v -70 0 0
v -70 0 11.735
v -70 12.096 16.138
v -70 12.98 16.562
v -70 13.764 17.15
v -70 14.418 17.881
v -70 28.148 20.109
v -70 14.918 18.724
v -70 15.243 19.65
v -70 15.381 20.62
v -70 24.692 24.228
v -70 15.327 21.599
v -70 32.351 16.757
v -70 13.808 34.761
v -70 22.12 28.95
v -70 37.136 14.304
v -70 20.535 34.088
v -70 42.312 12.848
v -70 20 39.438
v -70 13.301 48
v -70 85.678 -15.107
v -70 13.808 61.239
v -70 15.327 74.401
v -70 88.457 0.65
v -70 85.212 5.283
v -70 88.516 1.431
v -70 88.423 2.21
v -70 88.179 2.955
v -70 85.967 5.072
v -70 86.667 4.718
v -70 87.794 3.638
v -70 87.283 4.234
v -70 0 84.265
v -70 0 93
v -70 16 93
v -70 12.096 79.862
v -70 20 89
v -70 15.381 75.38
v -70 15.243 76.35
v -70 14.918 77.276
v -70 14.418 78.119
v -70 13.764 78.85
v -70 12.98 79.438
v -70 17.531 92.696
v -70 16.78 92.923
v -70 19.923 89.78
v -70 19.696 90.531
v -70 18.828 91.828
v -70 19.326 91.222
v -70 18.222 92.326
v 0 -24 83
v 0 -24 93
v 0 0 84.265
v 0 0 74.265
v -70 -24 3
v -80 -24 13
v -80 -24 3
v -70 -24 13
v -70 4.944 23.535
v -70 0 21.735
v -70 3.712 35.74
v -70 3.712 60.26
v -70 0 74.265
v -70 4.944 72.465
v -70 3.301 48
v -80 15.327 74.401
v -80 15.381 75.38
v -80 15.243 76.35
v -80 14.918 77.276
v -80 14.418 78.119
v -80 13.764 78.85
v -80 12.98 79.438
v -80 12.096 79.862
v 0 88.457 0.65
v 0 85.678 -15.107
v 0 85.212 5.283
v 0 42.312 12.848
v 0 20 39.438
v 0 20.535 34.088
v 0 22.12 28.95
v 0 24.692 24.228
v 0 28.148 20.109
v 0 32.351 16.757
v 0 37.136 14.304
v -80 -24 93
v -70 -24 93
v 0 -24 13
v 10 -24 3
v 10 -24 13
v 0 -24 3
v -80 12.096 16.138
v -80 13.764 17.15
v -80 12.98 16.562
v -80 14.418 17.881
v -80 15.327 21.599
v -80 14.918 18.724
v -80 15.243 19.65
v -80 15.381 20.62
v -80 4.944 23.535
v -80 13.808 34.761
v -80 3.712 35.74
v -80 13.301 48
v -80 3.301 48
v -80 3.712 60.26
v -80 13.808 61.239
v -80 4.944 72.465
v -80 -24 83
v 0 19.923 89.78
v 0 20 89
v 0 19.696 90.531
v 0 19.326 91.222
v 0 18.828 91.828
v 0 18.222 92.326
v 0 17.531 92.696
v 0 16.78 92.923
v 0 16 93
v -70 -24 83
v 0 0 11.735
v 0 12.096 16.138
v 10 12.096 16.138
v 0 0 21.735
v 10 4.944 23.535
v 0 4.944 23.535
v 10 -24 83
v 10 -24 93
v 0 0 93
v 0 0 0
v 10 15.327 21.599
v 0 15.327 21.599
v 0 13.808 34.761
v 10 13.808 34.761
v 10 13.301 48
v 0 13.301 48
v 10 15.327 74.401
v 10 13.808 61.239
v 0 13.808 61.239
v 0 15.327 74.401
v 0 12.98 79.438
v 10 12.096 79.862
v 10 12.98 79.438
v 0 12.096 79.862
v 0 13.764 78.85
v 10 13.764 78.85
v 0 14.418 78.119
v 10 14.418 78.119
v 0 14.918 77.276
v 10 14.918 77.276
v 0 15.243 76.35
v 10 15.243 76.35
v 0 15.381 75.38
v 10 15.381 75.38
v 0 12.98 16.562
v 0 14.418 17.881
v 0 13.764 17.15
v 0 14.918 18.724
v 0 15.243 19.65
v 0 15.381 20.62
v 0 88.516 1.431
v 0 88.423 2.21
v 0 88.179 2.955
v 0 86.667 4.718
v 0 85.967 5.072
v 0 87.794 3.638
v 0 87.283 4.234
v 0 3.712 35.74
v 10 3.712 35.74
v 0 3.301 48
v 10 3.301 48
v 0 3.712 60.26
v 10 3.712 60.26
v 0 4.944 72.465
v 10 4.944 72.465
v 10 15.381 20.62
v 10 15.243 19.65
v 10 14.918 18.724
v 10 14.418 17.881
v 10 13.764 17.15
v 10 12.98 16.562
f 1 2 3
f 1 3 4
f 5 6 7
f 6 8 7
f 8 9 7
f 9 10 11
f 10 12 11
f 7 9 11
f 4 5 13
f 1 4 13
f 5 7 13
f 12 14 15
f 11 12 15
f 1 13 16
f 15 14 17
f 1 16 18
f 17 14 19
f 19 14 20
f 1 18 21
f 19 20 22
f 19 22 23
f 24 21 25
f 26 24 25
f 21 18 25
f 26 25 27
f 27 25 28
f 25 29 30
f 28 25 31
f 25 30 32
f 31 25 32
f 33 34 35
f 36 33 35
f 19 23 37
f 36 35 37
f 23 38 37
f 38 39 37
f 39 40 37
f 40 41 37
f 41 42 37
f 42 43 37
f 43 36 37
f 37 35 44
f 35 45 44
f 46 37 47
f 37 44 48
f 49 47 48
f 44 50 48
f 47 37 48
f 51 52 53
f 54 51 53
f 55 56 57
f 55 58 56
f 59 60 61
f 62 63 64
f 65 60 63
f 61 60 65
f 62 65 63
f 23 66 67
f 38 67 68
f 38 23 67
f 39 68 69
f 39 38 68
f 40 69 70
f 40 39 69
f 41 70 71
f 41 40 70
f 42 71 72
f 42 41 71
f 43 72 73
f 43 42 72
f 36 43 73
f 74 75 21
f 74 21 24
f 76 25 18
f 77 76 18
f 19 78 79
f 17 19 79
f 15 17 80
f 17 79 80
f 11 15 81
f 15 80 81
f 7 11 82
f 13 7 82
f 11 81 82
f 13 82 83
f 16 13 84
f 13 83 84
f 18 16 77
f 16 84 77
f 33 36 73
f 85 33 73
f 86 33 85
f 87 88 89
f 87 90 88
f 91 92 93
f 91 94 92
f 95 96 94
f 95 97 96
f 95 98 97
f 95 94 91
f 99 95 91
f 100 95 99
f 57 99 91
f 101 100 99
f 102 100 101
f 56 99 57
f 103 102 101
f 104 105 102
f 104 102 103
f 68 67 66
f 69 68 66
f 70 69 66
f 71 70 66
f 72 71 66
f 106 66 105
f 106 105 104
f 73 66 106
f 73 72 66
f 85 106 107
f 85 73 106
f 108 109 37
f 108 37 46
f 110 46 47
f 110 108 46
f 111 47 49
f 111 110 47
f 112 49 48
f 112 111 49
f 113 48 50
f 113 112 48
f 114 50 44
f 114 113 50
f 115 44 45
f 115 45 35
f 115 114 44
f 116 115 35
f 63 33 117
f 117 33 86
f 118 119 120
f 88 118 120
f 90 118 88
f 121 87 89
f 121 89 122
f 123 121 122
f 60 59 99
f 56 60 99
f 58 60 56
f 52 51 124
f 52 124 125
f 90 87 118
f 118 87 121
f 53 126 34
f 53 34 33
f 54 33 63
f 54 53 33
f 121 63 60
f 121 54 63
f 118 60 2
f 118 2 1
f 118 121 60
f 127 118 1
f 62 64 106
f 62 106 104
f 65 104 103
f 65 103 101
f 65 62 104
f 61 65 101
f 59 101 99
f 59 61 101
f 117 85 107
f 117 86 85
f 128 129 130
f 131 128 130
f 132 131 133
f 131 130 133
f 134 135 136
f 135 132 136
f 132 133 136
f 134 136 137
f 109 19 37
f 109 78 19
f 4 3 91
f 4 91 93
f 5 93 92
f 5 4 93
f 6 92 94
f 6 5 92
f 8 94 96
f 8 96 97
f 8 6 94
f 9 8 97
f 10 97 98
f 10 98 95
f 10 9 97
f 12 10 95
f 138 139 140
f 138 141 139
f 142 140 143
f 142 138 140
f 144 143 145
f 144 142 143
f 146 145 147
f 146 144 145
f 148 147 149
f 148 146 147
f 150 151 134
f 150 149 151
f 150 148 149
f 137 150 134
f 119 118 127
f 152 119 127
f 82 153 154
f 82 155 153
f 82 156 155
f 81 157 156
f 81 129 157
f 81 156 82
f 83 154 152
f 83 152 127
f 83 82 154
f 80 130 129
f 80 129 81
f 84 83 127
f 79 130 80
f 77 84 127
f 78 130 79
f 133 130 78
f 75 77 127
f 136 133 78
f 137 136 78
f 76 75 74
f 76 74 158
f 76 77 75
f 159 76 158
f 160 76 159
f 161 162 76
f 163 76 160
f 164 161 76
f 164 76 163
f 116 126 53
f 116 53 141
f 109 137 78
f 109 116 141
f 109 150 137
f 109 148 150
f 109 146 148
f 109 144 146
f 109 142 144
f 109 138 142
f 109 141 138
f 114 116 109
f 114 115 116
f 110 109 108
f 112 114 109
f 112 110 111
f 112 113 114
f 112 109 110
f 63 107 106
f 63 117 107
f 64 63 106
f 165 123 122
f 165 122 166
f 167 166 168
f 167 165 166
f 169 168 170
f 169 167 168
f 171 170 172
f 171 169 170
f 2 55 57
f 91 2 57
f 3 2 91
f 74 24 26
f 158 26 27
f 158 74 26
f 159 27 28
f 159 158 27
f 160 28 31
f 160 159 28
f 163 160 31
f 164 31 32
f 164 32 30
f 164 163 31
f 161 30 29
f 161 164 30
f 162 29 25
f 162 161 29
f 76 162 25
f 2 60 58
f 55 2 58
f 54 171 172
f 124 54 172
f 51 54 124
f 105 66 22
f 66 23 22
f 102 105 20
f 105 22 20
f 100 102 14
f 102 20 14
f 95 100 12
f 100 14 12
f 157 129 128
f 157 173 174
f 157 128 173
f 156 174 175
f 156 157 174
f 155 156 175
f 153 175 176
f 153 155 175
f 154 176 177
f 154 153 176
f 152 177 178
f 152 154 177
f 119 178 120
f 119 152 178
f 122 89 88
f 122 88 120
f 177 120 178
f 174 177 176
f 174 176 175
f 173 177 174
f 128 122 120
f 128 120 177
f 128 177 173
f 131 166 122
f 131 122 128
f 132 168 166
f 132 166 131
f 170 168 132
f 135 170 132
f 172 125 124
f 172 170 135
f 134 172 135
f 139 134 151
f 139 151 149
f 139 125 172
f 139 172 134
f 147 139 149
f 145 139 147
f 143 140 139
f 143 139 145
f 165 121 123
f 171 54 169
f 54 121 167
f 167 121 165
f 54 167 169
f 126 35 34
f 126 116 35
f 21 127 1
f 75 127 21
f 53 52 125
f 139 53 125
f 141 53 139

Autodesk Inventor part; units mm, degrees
ref_plane "YZ Plane" through (0, 0, 0) normal (1, 0, 0) x (0, 1, 0)
ref_plane "XZ Plane" through (0, 0, 0) normal (0, 1, 0) x (-1, 0, 0)
sketch "Boceto1" plane through (0, 0, 0) normal (1, 0, 0) x (0, 1, 0)
  line L0 (85.212, 5.2834) -> (42.3115, 12.8479)
  arc A0 (20, 39.4377) -> (42.3115, 12.8479) centre (47, 39.4377) ccw
  line L1 (20, 39.4377) -> (20, 89)
  line L2 (16, 93) -> (0, 93)
  line L3 (0, 93) -> (0, 0)
  line L4 (0, 0) -> (85.6783, -15.1074)
  line L5 (85.6783, -15.1074) -> (88.4566, 0.6495)
  arc A1 (88.4566, 0.6495) -> (85.212, 5.2834) centre (84.5174, 1.3441) ccw
  arc A2 (20, 89) -> (16, 93) centre (16, 89) ccw
  line L6 (-24, 93) -> (12.0957, 79.8622)
  line L7 (12.0957, 16.1378) -> (-24, 3)
  line L8 (-24, 3) -> (-24, 13)
  line L9 (-24, 13) -> (4.9435, 23.5346)
  line L10 (4.9435, 72.4654) -> (-24, 83)
  line L11 (-24, 83) -> (-24, 93)
  arc A3 (15.327, 74.4007) -> (15.327, 21.5993) centre (186.3007, 48) ccw
  arc A4 (4.9435, 72.4654) -> (4.9435, 23.5346) centre (186.3007, 48) ccw
  arc A5 (15.327, 74.4007) -> (12.0957, 79.8622) centre (10.3856, 75.1638) ccw
  arc A6 (12.0957, 16.1378) -> (15.327, 21.5993) centre (10.3856, 20.8362) ccw
  point P0 (20, 93)
  point P1 (89.1512, 4.5888)
  point P2 (16, 78.4412)
  point P3 (16, 17.5588)
  dimension "d0" = 87
  dimension "d1" = 20
  dimension "d2" = 20
  dimension "d3" = 27
  dimension "d4" = 100
  dimension "d5" = 93
  dimension "d6" = 4
  dimension "d7" = 24
  dimension "d8" = 16
  dimension "d9" = 110
  dimension "d10" = 90
  dimension "d11" = 70
  dimension "d12" = 10
  dimension "d13" = 10
  dimension "d14" = 3
  dimension "d17" = 110
  dimension "d23" = 173
  dimension "d24" = 10
  dimension "d25" = 183
  dimension "d26" = 5
extrude "Extrusión1" add sketch "Boceto1" against normal blind 70 contours A1 L5 L4 L3 L7 A6 A3 A5 L6 L2 A2 L1 A0 L0 | L3 L9 A4 L10 L6 A5 A3 A6 L7 | L3 L10 A4 L9
extrude "Extrusión2" add sketch "Boceto1" along normal blind 10 contours L7 L8 L9 L3 | L3 L9 A4 L10 L6 A5 A3 A6 L7 | L3 L10 L11 L6
ref_plane "Plano de trabajo1" through (-35, 0, 0) normal (1, 0, 0) x (0, 0, -1)
mirror "Simetría1" about plane through (-35, 0, 0) normal (1, 0, 0) of "Extrusión2"
properties part number "Pieza de practica 14"
